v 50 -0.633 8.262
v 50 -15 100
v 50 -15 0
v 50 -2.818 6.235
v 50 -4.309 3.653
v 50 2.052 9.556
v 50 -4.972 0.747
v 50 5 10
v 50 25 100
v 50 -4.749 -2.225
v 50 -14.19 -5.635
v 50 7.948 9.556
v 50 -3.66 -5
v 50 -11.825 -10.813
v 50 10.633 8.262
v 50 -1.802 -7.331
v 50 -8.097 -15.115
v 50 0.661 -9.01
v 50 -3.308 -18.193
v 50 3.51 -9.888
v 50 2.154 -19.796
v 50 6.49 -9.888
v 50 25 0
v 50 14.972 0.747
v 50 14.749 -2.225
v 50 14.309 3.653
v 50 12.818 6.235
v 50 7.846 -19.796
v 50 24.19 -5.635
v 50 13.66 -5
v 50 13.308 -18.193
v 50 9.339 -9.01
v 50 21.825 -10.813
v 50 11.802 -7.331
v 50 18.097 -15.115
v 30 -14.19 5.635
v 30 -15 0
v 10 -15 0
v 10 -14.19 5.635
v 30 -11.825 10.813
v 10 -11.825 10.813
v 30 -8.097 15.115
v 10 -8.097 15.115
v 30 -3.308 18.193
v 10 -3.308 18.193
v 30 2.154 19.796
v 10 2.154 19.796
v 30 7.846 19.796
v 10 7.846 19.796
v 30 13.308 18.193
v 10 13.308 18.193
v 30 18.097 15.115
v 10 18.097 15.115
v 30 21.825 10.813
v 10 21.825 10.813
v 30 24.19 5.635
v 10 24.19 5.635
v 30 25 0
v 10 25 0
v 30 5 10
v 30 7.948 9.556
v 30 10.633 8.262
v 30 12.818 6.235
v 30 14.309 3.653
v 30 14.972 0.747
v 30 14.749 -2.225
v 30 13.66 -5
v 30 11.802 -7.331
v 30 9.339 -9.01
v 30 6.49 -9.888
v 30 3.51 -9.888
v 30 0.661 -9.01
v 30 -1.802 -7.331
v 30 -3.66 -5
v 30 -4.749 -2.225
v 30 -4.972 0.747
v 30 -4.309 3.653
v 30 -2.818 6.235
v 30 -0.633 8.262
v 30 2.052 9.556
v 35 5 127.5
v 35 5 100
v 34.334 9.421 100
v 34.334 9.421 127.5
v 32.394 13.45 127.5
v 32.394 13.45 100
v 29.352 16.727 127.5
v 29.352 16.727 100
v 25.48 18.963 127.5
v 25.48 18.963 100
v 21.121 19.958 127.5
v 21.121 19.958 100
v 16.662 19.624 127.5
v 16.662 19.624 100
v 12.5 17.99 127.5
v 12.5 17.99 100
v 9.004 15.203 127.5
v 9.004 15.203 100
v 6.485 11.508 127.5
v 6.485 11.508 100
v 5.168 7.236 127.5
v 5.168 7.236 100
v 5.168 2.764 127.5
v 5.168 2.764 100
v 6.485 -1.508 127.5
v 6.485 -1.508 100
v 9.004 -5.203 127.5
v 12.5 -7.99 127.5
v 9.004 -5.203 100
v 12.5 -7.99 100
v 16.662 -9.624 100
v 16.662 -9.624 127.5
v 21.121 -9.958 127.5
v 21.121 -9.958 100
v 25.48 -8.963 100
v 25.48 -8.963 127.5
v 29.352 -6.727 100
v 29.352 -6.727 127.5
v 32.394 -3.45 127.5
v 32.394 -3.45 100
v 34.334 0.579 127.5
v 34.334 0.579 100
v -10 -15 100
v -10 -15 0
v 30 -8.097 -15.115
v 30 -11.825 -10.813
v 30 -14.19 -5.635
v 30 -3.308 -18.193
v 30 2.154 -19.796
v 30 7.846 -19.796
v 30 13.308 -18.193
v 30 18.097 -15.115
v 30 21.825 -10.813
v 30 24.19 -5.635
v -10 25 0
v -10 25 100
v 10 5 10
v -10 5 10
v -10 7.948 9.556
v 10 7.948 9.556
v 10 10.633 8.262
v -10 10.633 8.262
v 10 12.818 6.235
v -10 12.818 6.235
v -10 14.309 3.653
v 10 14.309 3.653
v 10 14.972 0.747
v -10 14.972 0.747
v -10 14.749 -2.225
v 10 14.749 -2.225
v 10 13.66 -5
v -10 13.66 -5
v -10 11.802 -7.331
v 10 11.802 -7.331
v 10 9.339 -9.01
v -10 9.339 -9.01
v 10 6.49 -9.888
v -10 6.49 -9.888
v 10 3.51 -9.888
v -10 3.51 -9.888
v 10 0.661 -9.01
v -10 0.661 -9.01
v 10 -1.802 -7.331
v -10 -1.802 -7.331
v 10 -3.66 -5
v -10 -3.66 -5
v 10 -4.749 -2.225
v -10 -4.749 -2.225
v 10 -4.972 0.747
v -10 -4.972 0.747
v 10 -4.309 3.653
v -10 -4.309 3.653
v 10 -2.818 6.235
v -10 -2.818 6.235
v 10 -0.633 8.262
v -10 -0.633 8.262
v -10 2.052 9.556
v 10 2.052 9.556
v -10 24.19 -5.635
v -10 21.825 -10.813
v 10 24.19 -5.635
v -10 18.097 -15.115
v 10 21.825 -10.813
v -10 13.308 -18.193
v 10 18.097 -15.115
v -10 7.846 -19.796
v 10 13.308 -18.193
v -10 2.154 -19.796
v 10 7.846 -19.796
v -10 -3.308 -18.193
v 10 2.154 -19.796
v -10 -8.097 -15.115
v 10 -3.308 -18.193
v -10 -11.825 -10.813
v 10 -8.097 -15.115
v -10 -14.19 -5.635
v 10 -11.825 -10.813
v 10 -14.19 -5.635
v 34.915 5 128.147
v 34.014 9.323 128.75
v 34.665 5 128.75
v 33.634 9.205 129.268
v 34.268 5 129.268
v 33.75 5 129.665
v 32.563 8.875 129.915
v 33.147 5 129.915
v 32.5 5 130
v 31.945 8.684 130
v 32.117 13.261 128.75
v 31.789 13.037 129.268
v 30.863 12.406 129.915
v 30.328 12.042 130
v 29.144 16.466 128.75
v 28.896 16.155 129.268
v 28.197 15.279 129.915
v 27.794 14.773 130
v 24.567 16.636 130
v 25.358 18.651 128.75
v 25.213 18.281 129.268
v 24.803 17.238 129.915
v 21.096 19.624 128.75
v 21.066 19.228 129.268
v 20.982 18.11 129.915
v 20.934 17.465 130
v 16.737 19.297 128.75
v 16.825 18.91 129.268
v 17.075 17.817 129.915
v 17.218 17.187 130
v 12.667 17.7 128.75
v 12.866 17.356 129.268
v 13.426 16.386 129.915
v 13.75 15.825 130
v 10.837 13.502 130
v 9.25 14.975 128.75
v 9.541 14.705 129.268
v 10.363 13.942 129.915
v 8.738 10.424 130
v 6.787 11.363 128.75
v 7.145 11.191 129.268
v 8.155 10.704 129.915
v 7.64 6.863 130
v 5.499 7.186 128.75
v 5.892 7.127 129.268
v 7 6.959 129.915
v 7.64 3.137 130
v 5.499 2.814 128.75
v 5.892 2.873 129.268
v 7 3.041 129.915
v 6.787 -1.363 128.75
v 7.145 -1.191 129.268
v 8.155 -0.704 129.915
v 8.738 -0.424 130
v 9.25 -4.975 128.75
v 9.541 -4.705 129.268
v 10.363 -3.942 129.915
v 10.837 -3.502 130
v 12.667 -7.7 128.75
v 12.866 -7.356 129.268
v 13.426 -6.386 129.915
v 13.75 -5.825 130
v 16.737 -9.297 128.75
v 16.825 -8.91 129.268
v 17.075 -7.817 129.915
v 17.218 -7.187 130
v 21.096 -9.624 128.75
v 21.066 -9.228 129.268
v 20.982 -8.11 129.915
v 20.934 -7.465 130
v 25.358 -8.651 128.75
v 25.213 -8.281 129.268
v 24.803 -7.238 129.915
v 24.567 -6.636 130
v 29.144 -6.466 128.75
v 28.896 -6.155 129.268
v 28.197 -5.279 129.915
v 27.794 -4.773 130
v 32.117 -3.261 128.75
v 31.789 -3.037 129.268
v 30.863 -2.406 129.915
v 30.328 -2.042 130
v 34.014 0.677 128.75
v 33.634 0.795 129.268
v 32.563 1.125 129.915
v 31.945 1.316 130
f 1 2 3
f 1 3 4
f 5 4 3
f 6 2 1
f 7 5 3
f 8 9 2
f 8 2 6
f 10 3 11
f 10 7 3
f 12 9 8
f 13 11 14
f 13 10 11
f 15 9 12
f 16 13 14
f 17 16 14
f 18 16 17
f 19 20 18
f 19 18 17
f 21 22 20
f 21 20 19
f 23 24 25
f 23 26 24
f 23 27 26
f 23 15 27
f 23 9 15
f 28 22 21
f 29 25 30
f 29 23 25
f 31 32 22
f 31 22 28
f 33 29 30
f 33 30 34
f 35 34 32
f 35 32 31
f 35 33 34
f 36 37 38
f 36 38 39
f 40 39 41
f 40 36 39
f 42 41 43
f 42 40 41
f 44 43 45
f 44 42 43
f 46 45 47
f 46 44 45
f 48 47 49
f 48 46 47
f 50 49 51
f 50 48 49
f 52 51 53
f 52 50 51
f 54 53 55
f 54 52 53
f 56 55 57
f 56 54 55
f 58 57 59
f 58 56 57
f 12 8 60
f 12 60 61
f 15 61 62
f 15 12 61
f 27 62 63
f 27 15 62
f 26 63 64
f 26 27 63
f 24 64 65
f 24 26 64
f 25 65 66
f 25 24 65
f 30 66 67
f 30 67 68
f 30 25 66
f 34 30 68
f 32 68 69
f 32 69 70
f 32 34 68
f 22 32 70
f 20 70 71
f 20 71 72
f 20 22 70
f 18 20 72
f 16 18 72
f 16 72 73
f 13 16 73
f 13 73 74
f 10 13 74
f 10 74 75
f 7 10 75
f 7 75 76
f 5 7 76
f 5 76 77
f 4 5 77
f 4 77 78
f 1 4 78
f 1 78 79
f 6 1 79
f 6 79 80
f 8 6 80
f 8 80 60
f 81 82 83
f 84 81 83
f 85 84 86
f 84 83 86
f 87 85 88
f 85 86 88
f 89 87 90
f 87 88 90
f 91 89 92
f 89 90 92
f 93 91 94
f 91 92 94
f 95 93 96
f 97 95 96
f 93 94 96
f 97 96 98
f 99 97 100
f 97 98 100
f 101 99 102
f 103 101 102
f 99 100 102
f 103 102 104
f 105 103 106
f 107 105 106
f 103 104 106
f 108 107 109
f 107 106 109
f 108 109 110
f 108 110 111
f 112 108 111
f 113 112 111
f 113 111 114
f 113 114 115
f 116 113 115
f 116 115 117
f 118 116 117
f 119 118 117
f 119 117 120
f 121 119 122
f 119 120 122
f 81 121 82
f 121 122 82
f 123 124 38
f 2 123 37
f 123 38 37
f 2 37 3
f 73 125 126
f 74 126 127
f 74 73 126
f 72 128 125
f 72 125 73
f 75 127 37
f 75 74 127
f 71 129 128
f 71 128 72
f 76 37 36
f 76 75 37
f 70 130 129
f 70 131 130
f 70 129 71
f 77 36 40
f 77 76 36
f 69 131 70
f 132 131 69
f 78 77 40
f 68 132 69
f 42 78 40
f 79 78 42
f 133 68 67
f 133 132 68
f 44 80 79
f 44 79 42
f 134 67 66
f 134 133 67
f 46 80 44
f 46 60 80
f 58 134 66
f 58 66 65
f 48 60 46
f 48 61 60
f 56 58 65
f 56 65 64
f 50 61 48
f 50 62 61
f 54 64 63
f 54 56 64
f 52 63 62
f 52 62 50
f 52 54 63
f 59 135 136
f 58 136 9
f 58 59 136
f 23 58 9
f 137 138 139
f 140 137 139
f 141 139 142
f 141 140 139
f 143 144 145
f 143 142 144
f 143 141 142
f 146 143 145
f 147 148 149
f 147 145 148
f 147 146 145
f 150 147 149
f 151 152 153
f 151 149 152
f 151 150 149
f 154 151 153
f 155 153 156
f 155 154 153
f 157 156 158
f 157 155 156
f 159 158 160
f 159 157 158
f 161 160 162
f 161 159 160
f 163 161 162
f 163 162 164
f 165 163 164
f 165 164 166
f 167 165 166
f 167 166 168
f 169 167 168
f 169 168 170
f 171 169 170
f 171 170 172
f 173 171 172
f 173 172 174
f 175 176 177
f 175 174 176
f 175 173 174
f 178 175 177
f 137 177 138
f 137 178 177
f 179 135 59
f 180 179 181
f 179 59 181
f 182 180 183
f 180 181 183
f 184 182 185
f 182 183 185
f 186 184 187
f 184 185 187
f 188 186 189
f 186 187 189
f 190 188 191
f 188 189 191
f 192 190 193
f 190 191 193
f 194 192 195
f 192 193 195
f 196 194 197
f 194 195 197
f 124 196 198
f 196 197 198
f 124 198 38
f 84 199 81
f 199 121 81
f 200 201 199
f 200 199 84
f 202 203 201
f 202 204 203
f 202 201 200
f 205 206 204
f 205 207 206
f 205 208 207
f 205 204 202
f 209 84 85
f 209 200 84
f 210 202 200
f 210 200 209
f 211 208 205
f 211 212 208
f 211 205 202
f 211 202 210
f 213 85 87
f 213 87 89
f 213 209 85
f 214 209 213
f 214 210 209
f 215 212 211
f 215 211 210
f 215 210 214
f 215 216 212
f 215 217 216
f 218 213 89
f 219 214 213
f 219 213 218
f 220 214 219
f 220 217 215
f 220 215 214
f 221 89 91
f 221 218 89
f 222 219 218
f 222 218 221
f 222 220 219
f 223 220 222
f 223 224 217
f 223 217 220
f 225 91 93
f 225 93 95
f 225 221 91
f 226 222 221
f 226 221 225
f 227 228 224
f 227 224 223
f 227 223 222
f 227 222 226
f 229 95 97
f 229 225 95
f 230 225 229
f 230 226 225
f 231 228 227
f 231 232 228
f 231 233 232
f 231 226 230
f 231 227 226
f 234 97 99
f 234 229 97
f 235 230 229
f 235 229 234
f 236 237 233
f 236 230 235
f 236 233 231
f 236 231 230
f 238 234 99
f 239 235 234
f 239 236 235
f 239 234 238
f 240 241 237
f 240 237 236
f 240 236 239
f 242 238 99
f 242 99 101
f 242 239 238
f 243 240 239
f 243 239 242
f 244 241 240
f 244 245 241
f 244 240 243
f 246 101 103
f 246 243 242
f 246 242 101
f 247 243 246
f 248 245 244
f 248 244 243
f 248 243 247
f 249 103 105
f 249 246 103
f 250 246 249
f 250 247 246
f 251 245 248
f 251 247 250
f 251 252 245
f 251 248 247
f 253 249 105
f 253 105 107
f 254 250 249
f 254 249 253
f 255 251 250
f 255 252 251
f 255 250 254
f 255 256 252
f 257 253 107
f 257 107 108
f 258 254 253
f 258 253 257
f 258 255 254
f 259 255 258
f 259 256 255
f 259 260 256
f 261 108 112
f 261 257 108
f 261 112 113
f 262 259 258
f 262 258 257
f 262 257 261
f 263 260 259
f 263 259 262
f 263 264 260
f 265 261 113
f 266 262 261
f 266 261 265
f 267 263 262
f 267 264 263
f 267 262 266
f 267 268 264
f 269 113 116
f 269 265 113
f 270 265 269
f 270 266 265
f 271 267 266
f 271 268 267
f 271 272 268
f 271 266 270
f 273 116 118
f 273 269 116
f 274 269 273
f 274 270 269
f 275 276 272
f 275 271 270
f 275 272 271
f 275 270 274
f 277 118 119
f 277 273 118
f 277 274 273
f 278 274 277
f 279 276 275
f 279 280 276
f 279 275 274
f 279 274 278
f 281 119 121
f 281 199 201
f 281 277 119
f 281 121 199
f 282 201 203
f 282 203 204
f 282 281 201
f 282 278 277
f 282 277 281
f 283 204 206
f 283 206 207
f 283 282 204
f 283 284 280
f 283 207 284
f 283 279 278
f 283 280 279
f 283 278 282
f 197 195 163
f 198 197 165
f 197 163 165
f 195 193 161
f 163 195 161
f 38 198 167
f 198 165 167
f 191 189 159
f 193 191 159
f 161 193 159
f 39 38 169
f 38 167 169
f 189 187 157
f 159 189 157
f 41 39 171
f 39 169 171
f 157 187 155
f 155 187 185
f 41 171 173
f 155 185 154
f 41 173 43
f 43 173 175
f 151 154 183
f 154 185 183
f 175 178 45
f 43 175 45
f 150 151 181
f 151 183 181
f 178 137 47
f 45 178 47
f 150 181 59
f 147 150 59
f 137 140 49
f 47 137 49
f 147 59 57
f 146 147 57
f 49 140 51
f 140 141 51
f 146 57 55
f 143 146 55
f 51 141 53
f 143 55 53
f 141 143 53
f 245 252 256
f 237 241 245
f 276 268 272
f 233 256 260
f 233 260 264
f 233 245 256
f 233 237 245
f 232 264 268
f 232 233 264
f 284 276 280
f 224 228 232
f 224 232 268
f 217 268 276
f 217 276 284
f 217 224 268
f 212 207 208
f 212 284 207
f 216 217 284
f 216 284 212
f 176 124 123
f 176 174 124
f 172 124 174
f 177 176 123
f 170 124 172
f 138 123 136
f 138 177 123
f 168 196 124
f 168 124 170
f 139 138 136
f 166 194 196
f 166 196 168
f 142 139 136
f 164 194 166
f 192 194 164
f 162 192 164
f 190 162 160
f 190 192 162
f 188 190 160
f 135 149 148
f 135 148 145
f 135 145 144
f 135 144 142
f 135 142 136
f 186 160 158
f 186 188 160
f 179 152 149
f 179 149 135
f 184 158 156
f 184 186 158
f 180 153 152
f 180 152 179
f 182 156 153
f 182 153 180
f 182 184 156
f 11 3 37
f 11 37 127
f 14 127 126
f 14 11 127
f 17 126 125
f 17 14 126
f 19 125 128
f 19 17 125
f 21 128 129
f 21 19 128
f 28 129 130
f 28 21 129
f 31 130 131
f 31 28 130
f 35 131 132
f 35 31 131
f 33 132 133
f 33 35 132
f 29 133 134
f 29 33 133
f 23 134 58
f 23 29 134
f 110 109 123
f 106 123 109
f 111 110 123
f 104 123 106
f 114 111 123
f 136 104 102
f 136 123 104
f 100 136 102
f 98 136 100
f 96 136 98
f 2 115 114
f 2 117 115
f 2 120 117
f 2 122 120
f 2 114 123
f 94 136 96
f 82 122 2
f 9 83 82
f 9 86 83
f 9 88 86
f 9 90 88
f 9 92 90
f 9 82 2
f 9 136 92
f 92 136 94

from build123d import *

# Parameters (mm, degrees)
SKETCH_1_W               = 60
SKETCH_1_H               = 40
EXTRUDE_1_DEPTH          = 100
SKETCH_6_R               = 20
EXTRUDE_2_DEPTH          = 20
EXTRUDE_START            = -20
SKETCH_7_R               = 20
EXTRUDE_3_DEPTH          = 20
CUT_EXTRUDE_1_DEPTH      = 120.268604419
CUT_EXTRUDE_1_DEPTH_BACK = 120.268604419
SKETCH_8_R               = 10
SKETCH_9_R               = 20
CUT_EXTRUDE_2_DEPTH      = 20
SKETCH_10_R              = 15
EXTRUDE_4_DEPTH          = 30
FILLET_1_R               = 2.5


with BuildPart() as part:
    # 스케치1 → 보스-돌출1 (new body)
    with BuildSketch(Plane.XY):
        with Locations((20, 5)):
            Rectangle(SKETCH_1_W, SKETCH_1_H)
    extrude(amount=EXTRUDE_1_DEPTH)

    # 스케치6 → 보스-돌출2 (add)
    with BuildSketch(Plane(origin=(50, 0, 0), x_dir=(0, 0, -1), z_dir=(1, 0, 0))):
        with Locations((0, 5)):
            Circle(SKETCH_6_R)
    extrude(amount=-EXTRUDE_2_DEPTH)

    # 스케치7 → 보스-돌출3 (add)
    with BuildSketch(Plane.ZY.offset(10).offset(EXTRUDE_START)):
        with Locations((0, 5)):
            Circle(SKETCH_7_R)
    extrude(amount=EXTRUDE_3_DEPTH)

    # 스케치8 → 컷-돌출1 (cut, two sides: drawn at the far end of the back side and taken through both)
    with BuildSketch(Plane.ZY.offset(10).offset(-CUT_EXTRUDE_1_DEPTH_BACK)):
        with Locations((0, 5)):
            Circle(SKETCH_8_R)
    extrude(amount=CUT_EXTRUDE_1_DEPTH + CUT_EXTRUDE_1_DEPTH_BACK, mode=Mode.SUBTRACT)

    # 스케치9 → 컷-돌출2 (cut)
    with BuildSketch(Plane.ZY.offset(-30)):
        with Locations((0, 5)):
            Circle(SKETCH_9_R)
    extrude(amount=CUT_EXTRUDE_2_DEPTH, mode=Mode.SUBTRACT)

    # 스케치10 → 보스-돌출4 (add)
    with BuildSketch(Plane.XY.offset(100)):
        with Locations((20, 5)):
            Circle(SKETCH_10_R)
    extrude(amount=EXTRUDE_4_DEPTH)

    # 필렛1
    fillet_1_edges = [part.edges().sort_by_distance(p)[0] for p in [
        (5, 5, 130),
    ]]
    fillet(fillet_1_edges, radius=FILLET_1_R)


solid = part.part
